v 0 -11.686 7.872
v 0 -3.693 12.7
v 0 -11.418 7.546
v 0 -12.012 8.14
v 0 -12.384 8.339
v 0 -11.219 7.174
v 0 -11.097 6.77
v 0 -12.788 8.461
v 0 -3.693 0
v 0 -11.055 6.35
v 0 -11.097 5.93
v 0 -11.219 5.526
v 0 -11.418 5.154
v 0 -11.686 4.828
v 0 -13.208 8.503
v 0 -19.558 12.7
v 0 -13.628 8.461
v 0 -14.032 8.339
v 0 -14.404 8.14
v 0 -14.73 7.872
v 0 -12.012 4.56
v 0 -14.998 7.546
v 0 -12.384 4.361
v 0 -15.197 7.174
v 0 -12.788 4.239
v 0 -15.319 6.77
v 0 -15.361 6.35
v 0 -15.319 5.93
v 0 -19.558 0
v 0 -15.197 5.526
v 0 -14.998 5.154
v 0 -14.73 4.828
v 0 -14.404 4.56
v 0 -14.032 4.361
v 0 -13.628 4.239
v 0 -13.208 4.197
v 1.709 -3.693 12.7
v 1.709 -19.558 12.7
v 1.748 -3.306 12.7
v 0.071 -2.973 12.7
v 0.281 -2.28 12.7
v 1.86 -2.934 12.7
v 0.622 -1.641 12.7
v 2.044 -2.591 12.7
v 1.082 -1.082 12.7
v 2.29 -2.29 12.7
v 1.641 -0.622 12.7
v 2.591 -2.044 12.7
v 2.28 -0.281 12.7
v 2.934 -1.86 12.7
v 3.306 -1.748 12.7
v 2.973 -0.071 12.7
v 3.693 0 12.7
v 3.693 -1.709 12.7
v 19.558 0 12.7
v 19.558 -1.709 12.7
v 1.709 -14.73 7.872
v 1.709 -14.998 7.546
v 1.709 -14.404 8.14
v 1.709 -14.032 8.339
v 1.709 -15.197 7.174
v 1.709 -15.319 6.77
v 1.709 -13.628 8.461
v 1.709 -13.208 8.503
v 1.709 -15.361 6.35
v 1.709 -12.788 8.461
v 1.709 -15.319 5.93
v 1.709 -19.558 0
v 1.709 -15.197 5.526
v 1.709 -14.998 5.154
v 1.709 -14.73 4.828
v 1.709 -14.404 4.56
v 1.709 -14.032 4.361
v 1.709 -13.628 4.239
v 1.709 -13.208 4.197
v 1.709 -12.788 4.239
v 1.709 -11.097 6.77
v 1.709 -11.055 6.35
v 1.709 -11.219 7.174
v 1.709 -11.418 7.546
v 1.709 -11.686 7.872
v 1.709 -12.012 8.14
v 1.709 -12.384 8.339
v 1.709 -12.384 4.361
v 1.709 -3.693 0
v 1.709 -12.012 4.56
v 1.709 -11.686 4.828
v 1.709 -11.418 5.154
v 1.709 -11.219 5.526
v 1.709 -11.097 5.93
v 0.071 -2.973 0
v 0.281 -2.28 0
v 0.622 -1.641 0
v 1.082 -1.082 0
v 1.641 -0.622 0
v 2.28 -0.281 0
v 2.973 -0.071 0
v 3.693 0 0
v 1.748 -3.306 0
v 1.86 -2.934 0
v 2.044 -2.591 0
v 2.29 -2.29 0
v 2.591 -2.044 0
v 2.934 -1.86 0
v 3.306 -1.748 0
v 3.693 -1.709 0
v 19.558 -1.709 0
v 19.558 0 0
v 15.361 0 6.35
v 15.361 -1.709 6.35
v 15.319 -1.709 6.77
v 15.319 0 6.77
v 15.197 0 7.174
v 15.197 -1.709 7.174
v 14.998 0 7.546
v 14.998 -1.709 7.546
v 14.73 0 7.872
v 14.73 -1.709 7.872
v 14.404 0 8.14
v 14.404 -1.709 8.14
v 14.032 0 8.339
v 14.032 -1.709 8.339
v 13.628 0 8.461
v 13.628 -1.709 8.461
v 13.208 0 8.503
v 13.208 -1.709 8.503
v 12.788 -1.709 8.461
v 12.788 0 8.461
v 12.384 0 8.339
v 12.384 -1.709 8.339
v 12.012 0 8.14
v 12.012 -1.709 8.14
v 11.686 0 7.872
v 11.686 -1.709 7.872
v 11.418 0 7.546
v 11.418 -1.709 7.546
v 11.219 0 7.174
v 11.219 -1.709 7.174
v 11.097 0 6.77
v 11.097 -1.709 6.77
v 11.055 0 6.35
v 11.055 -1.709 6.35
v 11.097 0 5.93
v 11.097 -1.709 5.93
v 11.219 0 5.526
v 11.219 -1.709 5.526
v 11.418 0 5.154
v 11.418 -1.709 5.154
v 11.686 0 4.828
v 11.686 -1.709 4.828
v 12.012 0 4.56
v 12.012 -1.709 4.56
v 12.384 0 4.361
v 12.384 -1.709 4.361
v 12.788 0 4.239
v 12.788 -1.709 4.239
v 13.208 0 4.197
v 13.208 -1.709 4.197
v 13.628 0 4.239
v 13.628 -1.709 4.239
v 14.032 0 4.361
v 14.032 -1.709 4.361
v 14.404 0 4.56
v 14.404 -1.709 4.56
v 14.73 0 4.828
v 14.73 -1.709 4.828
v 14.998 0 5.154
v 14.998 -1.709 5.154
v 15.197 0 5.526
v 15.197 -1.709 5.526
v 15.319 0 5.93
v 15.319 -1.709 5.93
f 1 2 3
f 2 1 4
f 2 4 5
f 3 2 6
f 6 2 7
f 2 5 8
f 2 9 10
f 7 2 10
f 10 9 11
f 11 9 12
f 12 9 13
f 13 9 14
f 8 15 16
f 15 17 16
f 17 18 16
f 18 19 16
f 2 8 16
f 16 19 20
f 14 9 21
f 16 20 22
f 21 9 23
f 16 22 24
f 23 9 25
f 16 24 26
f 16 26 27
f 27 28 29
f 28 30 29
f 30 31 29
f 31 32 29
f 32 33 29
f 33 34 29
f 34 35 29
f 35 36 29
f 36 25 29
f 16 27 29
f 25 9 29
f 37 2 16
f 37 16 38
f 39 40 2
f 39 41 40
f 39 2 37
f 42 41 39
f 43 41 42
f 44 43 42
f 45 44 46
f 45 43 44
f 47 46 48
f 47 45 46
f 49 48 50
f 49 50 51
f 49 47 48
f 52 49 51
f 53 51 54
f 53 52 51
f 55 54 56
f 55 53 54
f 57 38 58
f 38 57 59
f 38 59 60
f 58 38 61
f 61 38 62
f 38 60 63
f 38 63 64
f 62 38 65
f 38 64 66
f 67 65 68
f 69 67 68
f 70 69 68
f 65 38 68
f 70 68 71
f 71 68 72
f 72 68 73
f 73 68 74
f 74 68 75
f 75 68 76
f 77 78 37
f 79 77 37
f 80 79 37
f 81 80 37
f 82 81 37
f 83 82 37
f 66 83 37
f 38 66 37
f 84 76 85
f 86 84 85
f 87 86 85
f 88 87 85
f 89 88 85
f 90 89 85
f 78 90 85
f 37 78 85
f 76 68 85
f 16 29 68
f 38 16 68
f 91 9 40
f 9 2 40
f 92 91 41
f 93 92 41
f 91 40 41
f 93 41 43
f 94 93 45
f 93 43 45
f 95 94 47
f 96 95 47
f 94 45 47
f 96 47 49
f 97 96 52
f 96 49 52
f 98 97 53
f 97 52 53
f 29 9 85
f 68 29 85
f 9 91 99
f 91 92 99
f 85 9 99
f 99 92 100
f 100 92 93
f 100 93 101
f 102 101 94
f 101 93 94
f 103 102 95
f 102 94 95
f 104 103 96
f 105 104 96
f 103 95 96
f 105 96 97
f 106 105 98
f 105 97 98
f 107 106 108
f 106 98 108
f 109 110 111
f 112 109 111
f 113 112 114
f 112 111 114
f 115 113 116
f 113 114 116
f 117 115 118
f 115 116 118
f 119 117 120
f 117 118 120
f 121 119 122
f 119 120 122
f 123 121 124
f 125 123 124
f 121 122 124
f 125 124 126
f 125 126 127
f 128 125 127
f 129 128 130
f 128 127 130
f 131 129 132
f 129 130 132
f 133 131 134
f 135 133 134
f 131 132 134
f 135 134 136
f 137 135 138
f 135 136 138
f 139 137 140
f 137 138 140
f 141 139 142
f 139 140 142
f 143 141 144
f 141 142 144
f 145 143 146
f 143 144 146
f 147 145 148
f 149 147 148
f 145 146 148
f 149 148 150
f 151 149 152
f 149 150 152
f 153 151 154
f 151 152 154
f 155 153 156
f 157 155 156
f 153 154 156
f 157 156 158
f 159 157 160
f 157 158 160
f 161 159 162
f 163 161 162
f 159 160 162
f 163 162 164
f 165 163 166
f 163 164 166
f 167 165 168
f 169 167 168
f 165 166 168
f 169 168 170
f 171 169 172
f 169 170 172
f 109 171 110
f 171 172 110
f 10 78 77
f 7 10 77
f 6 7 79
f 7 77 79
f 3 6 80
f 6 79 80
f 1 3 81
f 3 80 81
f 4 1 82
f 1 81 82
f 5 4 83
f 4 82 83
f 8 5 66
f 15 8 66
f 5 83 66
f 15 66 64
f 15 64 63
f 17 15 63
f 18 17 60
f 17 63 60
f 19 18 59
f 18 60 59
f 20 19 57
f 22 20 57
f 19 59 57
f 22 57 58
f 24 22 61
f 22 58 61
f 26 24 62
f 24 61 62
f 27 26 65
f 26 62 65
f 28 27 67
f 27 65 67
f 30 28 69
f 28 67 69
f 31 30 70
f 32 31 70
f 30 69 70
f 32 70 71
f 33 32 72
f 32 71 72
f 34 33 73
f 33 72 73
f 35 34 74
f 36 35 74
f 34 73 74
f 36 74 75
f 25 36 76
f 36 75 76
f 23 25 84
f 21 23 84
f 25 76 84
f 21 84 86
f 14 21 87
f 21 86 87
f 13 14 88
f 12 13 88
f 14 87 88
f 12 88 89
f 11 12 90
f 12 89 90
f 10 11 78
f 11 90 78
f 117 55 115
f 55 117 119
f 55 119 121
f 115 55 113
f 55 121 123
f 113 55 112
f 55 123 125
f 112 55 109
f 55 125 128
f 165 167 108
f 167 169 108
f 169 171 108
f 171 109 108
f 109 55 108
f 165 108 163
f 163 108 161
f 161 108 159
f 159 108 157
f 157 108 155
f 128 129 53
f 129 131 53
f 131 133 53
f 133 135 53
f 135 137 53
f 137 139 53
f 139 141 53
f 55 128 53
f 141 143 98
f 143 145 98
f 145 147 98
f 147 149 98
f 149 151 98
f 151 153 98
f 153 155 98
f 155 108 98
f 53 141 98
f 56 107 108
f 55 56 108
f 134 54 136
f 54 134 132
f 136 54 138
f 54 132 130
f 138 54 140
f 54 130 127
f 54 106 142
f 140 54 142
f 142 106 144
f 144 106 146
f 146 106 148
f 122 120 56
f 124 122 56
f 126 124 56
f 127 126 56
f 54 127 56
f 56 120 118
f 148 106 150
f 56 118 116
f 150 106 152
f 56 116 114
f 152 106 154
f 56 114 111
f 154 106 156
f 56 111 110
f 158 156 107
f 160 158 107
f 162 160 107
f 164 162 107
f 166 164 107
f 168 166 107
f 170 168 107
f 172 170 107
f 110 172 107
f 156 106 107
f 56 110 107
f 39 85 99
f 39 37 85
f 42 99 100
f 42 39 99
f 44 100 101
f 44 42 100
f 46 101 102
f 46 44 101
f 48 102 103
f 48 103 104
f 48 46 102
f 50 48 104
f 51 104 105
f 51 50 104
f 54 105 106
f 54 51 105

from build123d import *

# Parameters (mm, degrees)
F1_DEPTH = 12.7
F2_R     = 1.98374
F3_R     = 3.69316
F4_R     = 2.15265
F5_DEPTH = 1.70942
F6_R     = 2.15265
F7_DEPTH = 1.70942


with BuildPart() as f1:
    # F0 (on Top) → F1 (new body)
    with BuildSketch(Plane.XY):
        Polygon((19.558, 0), (0, 0), (0, -19.558), (1.70942, -19.558), (1.70942, -1.70942), (19.558, -1.70942), align=None)
    extrude(amount=F1_DEPTH)

    # F2
    f2_edges = [f1.edges().sort_by_distance(p)[0] for p in [
        (1.70942, -1.70942, 6.35),
    ]]
    fillet(f2_edges, radius=F2_R)

    # F3
    f3_edges = [f1.edges().sort_by_distance(p)[0] for p in [
        (0, 0, 6.35),
    ]]
    fillet(f3_edges, radius=F3_R)

    # F4 (on face) → F5 (cut, through all)
    with BuildSketch(Plane.XZ.offset(1.70942)):
        with Locations((13.208, 6.35)):
            Circle(F4_R)
    extrude(amount=-F5_DEPTH, mode=Mode.SUBTRACT)

    # F6 (on face) → F7 (cut, through all)
    with BuildSketch(Plane.YZ.offset(1.70942)):
        with Locations((-13.208, 6.35)):
            Circle(F6_R)
    extrude(amount=-F7_DEPTH, mode=Mode.SUBTRACT)


solid = f1.part
